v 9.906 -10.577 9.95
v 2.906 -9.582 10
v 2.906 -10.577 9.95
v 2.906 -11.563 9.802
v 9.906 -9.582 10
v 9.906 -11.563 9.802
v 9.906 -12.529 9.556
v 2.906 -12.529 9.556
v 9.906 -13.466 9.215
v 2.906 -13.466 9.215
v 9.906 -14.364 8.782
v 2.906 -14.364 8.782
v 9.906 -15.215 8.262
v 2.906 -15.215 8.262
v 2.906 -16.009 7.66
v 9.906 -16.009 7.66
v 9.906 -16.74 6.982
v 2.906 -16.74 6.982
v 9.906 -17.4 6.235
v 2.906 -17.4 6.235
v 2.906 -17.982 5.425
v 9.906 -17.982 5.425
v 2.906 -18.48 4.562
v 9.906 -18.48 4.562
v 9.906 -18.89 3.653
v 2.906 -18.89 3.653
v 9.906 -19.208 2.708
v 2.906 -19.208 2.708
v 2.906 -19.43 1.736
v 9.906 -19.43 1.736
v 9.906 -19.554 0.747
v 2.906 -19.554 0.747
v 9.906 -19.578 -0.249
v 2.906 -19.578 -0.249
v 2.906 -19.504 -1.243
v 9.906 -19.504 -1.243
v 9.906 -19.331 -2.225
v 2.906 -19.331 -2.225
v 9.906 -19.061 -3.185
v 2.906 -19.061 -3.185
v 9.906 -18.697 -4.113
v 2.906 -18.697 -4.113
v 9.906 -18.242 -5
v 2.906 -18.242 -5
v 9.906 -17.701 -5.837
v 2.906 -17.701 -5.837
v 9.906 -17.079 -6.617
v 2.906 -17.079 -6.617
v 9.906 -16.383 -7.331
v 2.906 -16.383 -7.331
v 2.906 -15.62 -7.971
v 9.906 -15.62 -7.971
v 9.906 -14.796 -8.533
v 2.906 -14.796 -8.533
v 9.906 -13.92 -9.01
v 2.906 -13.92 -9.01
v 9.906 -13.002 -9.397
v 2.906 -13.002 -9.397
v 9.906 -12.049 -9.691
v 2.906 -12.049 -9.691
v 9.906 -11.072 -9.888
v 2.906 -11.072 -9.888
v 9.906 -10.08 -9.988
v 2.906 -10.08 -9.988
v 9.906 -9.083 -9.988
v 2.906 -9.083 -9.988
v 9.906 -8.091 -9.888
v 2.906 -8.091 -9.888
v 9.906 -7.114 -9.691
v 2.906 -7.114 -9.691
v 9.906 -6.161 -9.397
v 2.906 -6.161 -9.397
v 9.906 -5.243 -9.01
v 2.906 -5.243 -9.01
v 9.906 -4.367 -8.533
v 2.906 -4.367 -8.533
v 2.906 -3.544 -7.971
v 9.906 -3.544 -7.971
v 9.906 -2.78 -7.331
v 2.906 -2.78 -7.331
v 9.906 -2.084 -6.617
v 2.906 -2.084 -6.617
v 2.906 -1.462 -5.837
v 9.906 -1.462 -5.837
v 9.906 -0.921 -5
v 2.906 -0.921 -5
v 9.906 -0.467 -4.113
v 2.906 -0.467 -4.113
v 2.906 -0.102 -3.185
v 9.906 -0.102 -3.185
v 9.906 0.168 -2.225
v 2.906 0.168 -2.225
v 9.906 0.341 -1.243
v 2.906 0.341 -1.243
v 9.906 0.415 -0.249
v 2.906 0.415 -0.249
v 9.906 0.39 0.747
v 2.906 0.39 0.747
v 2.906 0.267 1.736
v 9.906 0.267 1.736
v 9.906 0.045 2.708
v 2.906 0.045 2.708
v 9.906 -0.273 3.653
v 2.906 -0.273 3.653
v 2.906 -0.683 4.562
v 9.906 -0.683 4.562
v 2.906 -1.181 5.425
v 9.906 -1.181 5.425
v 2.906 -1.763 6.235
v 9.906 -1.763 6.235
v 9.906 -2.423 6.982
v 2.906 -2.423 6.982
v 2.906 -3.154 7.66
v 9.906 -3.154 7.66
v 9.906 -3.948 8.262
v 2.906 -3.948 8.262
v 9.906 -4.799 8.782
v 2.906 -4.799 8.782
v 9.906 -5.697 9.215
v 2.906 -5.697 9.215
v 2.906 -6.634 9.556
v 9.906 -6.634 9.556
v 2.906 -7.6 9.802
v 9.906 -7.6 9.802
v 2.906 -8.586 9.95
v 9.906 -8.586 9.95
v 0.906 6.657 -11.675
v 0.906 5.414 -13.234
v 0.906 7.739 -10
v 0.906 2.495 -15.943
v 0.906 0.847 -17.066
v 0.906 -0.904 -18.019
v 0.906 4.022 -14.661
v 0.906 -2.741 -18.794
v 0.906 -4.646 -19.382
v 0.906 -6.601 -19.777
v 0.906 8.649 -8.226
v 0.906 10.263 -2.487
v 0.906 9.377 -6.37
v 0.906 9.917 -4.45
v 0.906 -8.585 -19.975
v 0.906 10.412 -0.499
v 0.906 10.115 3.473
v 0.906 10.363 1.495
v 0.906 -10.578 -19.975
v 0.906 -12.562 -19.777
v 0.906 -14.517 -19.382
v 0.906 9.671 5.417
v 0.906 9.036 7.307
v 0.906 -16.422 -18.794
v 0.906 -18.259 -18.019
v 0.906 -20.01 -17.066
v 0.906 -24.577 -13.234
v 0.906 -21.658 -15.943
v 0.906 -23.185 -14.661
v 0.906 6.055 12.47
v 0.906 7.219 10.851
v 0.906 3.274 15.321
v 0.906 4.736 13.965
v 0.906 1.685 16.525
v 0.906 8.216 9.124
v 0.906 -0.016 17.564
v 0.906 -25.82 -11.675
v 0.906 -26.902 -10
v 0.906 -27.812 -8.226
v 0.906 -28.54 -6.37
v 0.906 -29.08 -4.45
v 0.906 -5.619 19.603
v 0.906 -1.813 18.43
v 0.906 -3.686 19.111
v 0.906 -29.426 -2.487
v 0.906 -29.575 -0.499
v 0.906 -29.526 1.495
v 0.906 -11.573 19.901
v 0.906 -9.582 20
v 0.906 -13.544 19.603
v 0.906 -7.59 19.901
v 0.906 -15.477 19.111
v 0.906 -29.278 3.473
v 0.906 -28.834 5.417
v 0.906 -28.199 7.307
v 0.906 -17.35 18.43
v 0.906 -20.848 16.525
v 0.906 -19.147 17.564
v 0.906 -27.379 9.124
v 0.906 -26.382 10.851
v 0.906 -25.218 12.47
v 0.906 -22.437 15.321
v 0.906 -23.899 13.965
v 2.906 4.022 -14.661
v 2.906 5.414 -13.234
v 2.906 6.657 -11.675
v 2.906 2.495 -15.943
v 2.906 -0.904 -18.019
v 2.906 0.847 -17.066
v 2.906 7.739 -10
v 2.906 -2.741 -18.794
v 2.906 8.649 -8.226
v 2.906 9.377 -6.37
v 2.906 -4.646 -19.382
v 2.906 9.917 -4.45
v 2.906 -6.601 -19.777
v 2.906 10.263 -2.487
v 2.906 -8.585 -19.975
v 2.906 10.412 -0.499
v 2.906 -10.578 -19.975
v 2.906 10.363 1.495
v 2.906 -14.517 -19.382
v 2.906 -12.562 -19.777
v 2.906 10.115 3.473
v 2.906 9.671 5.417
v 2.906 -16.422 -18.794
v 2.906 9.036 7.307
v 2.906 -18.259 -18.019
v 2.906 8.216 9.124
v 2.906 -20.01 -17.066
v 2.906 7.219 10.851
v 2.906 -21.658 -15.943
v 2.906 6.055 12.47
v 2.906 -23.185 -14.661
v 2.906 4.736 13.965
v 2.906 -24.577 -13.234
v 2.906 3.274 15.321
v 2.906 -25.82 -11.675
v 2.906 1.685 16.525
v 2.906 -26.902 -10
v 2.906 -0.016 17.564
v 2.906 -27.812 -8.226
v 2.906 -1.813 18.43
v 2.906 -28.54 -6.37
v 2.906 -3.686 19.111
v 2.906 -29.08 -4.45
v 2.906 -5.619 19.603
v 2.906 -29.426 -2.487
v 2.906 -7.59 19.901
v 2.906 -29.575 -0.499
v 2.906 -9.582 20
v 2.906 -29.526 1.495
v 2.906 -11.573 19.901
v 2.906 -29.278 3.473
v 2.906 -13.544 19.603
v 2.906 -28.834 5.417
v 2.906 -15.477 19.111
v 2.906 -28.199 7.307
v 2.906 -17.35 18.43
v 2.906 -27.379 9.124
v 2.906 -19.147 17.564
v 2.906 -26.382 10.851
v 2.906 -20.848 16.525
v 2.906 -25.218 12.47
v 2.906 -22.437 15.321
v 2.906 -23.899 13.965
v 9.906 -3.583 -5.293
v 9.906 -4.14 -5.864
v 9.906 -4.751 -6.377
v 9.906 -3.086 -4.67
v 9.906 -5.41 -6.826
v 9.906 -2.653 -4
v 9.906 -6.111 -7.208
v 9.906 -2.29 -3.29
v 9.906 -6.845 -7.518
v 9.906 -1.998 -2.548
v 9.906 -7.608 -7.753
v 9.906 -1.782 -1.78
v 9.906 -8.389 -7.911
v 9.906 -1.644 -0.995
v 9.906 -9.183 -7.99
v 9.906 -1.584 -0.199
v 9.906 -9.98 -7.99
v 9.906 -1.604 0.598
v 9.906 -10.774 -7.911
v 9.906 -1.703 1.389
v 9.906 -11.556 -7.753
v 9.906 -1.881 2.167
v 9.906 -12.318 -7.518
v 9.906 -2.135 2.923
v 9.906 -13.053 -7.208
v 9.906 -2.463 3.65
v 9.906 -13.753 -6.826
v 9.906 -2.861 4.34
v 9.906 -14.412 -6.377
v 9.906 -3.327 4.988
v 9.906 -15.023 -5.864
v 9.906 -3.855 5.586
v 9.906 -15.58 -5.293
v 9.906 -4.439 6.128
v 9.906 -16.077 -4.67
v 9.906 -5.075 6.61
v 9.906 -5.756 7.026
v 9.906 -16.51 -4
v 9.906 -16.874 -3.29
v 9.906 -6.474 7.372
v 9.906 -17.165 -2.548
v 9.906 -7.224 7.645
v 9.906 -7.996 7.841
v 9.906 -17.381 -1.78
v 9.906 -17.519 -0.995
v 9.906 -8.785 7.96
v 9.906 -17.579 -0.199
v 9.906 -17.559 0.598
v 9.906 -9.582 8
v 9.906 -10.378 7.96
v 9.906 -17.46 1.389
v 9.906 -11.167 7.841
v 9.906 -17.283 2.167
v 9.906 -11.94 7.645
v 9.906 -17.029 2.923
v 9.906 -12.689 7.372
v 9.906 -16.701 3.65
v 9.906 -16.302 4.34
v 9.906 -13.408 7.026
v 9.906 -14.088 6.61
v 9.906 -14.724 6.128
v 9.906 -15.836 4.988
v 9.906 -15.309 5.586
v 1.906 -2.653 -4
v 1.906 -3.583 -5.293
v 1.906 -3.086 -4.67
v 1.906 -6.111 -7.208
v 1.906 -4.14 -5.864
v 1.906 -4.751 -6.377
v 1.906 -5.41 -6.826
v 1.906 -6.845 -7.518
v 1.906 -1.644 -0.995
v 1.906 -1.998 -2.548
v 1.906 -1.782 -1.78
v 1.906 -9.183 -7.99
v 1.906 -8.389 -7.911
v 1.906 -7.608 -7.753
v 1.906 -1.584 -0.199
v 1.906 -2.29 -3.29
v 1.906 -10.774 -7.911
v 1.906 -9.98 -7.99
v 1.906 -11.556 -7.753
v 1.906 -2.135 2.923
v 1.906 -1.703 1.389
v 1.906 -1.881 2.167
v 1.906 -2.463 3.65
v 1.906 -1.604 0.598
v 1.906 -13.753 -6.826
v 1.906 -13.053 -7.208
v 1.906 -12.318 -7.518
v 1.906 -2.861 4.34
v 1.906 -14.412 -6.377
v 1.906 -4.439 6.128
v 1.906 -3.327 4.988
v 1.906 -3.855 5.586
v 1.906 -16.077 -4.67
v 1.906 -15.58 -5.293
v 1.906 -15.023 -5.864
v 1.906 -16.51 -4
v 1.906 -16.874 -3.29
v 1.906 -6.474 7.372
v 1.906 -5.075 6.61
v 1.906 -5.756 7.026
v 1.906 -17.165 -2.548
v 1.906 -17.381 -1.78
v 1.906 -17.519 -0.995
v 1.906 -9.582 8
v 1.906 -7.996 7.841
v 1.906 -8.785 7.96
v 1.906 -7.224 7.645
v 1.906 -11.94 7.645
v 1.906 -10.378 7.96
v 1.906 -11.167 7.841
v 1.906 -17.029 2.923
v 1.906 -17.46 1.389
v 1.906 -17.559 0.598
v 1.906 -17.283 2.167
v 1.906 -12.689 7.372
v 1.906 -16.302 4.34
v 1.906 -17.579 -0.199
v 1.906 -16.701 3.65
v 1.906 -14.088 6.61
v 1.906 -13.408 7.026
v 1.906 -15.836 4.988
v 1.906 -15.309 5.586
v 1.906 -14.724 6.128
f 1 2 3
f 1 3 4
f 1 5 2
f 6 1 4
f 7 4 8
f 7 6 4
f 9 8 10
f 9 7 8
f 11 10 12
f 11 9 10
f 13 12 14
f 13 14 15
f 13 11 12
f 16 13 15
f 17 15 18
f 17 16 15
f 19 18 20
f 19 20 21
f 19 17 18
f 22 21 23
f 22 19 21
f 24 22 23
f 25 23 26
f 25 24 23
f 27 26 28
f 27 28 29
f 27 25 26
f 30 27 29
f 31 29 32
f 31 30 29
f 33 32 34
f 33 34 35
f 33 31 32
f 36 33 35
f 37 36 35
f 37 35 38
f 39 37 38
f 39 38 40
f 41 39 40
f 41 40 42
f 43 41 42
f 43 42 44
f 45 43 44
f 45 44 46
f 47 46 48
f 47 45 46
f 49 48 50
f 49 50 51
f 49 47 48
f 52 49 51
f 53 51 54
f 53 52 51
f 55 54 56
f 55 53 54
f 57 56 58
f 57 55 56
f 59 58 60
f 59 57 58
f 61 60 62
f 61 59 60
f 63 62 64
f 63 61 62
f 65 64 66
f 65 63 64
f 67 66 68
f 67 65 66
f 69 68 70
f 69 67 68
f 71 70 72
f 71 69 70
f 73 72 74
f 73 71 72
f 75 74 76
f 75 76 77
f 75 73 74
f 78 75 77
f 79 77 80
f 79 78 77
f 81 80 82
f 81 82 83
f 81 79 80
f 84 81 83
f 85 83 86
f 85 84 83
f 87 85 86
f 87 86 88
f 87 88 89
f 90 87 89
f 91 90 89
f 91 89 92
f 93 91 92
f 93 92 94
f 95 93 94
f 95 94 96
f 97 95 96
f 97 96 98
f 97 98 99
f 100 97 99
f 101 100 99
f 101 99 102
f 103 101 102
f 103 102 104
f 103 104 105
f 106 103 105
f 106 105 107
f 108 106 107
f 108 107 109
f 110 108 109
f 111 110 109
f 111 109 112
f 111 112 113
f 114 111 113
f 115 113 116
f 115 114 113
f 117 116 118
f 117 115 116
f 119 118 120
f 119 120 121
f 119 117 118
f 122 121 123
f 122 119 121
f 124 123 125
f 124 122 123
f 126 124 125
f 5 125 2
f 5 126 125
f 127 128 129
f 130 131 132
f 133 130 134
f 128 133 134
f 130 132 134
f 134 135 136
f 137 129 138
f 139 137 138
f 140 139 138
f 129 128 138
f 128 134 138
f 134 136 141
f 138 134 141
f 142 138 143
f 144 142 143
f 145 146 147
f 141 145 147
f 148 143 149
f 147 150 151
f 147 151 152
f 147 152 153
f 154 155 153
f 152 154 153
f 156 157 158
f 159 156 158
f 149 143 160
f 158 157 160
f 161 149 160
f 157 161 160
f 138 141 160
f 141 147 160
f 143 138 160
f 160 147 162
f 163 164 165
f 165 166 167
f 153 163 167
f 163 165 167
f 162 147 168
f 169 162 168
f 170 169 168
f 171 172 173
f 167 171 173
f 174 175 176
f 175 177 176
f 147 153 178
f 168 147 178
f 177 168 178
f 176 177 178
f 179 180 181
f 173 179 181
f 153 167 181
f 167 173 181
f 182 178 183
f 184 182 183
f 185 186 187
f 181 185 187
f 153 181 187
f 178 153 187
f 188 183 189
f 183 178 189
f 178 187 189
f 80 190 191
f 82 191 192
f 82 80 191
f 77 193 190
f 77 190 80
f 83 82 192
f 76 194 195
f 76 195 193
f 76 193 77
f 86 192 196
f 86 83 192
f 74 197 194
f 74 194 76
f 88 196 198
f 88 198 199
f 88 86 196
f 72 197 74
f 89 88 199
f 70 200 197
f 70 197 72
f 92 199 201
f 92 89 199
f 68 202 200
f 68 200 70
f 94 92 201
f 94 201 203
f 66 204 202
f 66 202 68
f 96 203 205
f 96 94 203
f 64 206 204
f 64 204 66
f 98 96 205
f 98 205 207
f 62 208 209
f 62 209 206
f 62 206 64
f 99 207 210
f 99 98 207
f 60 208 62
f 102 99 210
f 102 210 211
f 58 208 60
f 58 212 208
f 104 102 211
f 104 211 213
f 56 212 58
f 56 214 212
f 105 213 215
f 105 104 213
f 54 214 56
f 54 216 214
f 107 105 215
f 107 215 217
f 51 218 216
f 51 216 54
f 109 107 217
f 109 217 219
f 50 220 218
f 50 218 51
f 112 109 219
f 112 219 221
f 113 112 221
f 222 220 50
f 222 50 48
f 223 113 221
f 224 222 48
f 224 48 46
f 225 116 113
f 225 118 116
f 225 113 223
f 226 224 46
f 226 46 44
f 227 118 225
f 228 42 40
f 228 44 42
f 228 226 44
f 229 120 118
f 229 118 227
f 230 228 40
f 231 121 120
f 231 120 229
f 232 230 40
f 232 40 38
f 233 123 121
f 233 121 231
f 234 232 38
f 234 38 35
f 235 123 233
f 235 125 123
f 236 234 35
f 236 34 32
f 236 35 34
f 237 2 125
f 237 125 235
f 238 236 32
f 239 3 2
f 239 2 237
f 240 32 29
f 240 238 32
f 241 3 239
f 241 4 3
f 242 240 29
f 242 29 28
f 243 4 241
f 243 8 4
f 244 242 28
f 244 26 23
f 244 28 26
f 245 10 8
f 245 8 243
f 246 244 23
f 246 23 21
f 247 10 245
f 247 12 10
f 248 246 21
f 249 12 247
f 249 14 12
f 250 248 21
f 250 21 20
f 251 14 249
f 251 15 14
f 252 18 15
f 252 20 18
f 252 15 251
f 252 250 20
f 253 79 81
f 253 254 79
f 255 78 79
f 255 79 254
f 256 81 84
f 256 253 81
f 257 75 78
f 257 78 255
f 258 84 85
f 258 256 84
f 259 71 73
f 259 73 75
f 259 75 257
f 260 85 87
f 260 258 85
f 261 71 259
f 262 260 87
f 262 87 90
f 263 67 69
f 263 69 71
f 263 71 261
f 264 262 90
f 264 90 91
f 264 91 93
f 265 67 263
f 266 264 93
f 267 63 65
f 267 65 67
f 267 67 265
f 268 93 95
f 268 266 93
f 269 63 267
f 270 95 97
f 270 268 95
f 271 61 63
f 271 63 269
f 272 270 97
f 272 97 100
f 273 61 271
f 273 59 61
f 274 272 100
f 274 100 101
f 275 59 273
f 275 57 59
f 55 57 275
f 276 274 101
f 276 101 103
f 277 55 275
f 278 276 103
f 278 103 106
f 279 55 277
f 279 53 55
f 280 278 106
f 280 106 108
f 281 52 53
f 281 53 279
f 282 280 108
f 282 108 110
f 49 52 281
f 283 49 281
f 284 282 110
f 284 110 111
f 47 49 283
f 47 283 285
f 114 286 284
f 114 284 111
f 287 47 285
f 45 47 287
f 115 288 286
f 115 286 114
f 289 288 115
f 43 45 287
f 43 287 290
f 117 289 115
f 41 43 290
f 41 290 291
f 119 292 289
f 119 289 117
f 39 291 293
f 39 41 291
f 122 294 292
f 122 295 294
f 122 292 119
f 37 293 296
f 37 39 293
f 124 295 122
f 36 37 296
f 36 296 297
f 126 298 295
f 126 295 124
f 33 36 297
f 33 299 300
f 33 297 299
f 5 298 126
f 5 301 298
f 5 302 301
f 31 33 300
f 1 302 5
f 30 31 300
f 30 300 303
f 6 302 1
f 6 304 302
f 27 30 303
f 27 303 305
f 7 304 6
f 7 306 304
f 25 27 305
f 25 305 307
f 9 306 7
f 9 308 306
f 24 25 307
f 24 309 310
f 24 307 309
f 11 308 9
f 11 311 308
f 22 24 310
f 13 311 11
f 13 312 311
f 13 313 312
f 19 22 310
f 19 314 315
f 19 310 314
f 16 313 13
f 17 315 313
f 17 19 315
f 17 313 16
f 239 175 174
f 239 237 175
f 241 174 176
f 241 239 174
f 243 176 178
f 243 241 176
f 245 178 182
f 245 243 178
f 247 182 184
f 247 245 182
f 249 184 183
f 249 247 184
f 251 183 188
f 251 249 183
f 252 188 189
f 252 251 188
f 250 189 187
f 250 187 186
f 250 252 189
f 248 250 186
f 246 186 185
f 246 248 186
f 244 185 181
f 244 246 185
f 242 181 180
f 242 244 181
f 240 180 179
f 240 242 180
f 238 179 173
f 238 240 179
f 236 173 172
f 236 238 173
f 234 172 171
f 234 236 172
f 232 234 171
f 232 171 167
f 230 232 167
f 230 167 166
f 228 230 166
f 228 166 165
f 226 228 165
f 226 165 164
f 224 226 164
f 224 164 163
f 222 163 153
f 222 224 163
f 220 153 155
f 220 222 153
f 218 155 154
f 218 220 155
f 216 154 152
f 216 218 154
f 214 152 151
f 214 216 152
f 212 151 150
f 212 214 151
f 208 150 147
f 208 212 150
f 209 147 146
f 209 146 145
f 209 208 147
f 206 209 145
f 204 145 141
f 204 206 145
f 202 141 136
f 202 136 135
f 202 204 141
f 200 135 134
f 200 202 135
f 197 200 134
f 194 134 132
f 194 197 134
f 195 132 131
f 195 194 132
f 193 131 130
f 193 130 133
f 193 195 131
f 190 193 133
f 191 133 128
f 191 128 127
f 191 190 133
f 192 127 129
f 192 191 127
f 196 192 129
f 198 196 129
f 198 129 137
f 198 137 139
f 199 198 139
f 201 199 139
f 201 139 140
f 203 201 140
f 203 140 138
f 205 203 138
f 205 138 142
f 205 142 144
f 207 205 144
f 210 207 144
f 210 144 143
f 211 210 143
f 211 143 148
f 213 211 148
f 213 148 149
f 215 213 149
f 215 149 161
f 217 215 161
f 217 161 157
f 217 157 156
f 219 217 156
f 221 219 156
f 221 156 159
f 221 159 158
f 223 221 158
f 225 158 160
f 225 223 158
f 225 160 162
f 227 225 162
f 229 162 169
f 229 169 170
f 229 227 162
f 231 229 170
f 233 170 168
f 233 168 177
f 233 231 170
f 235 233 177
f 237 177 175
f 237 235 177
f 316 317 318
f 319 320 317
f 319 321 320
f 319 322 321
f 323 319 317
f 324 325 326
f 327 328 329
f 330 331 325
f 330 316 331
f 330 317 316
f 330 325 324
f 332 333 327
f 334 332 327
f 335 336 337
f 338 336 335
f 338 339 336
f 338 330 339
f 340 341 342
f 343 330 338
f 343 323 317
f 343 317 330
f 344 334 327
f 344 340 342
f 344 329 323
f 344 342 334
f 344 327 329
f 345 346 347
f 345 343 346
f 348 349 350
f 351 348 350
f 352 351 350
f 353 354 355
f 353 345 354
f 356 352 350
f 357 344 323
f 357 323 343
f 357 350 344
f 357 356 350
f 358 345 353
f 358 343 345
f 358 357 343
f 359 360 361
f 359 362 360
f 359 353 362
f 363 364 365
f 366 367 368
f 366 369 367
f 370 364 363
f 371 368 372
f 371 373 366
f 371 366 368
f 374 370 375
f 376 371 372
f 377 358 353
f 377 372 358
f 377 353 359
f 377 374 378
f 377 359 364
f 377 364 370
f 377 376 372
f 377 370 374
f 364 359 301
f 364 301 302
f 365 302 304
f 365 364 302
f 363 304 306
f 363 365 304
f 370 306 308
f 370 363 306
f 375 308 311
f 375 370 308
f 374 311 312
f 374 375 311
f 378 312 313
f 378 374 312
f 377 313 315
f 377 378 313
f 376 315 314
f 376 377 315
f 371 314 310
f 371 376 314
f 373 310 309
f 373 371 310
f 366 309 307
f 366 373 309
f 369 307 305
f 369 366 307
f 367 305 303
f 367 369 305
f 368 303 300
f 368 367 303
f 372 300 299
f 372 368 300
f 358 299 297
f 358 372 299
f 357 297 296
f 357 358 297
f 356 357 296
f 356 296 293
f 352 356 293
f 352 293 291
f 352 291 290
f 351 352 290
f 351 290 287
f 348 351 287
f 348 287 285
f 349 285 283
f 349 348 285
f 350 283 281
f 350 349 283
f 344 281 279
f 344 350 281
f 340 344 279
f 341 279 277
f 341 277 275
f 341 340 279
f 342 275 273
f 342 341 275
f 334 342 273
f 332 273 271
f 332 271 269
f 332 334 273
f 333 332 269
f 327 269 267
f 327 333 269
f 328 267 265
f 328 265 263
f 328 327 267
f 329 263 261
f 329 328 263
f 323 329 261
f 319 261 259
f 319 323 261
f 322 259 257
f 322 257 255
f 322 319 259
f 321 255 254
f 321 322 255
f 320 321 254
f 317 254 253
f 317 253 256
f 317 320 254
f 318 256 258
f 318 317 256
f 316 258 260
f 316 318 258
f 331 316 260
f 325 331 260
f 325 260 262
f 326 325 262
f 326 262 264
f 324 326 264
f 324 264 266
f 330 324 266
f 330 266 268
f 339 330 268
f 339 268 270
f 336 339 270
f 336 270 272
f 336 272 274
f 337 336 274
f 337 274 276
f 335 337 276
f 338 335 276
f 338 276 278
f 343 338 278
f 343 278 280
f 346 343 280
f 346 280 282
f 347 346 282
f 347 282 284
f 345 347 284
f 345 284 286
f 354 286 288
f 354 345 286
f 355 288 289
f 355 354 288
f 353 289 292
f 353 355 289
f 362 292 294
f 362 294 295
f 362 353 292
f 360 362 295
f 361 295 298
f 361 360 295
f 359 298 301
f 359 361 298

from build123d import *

# Parameters (mm, degrees)
BOSS_EXTRUDE1_START = -9
SKETCH2_R           = 10
BOSS_EXTRUDE1_DEPTH = 1


with BuildPart() as part:
    # Sketch1 → Revolve1 (revolve)
    with BuildSketch(Plane.XY, mode=Mode.PRIVATE) as revolve1_sk:
        Polygon((0.905904645, 10.418424893), (2.905904645, 10.418424893), (2.905904645, 0.418424893), (9.905904645, 0.418424893), (9.905904645, -1.581575107), (0.905904645, -1.581575107), (0.905904645, 8.418424893), align=None)
    revolve(revolve1_sk.sketch.rotate(Axis((0.905904645, -9.581575107, 0), (1, 0, 0)), 90), axis=Axis((0.905904645, -9.581575107, 0), (1, 0, 0)))

    # Sketch2 → Boss-Extrude1 (add)
    with BuildSketch(Plane(origin=(9.905904645, 0, 0), x_dir=(0, 0, -1), z_dir=(1, 0, 0)).offset(BOSS_EXTRUDE1_START)):
        with Locations(Location((0, -9.581575107, 0), (0, 0, 180))):
            Circle(SKETCH2_R)
    extrude(amount=BOSS_EXTRUDE1_DEPTH)


solid = part.part
